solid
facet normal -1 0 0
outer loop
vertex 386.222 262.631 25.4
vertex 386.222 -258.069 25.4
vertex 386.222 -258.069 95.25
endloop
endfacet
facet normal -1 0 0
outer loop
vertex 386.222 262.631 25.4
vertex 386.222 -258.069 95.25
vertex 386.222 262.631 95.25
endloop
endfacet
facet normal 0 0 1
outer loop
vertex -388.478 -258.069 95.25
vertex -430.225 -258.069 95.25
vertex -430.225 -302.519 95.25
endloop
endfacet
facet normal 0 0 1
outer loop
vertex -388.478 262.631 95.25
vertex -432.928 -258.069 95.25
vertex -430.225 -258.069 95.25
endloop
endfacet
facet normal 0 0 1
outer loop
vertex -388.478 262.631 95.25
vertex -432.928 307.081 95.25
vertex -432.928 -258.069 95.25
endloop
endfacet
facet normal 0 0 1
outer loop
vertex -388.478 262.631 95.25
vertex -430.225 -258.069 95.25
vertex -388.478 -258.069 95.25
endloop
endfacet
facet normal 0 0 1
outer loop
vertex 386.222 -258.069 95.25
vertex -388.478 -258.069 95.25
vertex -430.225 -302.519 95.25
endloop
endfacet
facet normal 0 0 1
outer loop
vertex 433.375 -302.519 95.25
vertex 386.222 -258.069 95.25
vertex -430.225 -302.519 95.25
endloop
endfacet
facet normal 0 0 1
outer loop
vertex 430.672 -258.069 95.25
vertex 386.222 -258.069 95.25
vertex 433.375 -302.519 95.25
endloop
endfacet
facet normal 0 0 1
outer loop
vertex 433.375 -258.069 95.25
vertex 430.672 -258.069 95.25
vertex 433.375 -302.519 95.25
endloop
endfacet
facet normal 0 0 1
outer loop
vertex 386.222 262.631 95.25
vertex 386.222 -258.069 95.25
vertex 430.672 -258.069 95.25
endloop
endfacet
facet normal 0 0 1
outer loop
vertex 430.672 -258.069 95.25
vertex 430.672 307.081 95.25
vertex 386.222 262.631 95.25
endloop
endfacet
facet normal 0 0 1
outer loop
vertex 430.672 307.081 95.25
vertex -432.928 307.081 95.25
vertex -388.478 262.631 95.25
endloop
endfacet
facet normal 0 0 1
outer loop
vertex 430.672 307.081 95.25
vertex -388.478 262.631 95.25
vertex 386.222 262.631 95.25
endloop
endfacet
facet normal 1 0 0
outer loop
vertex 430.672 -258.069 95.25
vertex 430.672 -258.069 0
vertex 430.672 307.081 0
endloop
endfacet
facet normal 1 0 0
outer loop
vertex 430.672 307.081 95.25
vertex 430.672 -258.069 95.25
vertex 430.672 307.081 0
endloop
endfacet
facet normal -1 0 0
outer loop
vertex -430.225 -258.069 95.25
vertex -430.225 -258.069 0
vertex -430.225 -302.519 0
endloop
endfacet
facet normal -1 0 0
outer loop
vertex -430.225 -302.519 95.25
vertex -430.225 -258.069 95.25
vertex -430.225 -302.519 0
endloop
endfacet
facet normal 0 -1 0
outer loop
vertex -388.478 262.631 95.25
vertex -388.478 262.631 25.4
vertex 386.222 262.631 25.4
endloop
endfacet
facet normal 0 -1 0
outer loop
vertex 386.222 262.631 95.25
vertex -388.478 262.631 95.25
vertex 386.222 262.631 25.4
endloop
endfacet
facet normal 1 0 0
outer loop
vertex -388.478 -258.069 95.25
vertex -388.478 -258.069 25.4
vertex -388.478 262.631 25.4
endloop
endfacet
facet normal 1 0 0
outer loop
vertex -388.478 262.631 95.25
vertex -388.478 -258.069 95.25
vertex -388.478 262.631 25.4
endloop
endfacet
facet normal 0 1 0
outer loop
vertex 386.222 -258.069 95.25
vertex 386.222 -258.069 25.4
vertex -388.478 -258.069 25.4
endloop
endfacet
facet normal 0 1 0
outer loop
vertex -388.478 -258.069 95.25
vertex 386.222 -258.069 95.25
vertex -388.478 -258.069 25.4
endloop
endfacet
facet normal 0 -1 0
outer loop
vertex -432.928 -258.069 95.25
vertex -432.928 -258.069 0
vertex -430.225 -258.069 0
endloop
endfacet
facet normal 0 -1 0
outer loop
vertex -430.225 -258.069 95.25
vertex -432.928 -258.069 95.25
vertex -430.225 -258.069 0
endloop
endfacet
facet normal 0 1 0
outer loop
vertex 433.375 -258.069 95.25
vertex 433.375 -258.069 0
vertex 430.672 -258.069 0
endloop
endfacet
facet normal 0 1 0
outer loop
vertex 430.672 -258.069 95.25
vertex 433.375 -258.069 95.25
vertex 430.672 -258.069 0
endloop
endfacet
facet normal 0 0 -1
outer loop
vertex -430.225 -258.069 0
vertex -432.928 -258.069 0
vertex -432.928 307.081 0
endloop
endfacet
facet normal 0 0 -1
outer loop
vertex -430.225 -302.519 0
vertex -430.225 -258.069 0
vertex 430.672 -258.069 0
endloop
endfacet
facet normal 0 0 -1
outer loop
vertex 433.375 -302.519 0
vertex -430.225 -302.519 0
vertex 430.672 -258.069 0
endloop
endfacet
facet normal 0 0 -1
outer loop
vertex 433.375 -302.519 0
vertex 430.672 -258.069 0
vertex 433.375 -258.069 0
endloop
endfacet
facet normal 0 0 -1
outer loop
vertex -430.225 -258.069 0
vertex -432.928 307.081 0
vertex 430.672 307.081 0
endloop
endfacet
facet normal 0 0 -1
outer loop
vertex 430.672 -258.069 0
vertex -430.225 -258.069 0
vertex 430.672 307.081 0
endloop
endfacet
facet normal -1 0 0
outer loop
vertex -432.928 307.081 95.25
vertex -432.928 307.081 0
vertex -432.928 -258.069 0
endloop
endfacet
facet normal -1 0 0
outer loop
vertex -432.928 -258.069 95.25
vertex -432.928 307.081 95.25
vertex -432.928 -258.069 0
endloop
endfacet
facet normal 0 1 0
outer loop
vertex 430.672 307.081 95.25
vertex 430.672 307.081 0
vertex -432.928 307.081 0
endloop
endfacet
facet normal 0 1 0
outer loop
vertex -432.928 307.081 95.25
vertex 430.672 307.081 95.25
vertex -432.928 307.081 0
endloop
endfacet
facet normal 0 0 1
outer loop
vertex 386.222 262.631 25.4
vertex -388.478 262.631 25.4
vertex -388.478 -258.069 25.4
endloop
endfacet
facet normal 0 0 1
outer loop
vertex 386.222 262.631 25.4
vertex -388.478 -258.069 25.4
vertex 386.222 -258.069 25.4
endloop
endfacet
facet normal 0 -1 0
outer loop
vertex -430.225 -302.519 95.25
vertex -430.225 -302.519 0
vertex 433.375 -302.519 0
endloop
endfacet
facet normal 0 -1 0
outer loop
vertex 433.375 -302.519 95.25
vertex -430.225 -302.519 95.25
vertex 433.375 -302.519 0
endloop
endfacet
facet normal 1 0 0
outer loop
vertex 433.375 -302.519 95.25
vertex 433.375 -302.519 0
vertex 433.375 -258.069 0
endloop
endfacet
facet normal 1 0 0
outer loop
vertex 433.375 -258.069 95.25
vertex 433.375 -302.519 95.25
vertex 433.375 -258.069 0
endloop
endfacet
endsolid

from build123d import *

# Parameters (mm, degrees)
F0_W     = 44.45
F0_H     = 520.7
F1_DEPTH = 95.25
F0_W_2   = 774.7
F2_DEPTH = 25.4


with BuildPart() as f1:
    # F0 (on Top) → F1 (new body)
    with BuildSketch(Plane.XY):
        with Locations((408.446951, 2.281439)):
            Rectangle(F0_W, F0_H)
        Polygon((433.374935, -258.068561), (430.671951, -258.068561), (386.221951, -258.068561), (-388.478049, -258.068561), (-430.225065, -258.068561), (-430.225065, -302.518561), (433.374935, -302.518561), align=None)
        Polygon((-388.478049, 262.631439), (-432.928049, 262.631439), (-432.928049, -258.068561), (-430.225065, -258.068561), (-388.478049, -258.068561), align=None)
        Polygon((430.671951, 307.081439), (-432.928049, 307.081439), (-432.928049, 262.631439), (-388.478049, 262.631439), (386.221951, 262.631439), (430.671951, 262.631439), align=None)
    extrude(amount=F1_DEPTH)

    # F0 (on Top) → F2 (join)
    with BuildSketch(Plane.XY):
        with Locations((-1.128049, 2.281439)):
            Rectangle(F0_W_2, F0_H)
    extrude(amount=F2_DEPTH)


solid = f1.part
